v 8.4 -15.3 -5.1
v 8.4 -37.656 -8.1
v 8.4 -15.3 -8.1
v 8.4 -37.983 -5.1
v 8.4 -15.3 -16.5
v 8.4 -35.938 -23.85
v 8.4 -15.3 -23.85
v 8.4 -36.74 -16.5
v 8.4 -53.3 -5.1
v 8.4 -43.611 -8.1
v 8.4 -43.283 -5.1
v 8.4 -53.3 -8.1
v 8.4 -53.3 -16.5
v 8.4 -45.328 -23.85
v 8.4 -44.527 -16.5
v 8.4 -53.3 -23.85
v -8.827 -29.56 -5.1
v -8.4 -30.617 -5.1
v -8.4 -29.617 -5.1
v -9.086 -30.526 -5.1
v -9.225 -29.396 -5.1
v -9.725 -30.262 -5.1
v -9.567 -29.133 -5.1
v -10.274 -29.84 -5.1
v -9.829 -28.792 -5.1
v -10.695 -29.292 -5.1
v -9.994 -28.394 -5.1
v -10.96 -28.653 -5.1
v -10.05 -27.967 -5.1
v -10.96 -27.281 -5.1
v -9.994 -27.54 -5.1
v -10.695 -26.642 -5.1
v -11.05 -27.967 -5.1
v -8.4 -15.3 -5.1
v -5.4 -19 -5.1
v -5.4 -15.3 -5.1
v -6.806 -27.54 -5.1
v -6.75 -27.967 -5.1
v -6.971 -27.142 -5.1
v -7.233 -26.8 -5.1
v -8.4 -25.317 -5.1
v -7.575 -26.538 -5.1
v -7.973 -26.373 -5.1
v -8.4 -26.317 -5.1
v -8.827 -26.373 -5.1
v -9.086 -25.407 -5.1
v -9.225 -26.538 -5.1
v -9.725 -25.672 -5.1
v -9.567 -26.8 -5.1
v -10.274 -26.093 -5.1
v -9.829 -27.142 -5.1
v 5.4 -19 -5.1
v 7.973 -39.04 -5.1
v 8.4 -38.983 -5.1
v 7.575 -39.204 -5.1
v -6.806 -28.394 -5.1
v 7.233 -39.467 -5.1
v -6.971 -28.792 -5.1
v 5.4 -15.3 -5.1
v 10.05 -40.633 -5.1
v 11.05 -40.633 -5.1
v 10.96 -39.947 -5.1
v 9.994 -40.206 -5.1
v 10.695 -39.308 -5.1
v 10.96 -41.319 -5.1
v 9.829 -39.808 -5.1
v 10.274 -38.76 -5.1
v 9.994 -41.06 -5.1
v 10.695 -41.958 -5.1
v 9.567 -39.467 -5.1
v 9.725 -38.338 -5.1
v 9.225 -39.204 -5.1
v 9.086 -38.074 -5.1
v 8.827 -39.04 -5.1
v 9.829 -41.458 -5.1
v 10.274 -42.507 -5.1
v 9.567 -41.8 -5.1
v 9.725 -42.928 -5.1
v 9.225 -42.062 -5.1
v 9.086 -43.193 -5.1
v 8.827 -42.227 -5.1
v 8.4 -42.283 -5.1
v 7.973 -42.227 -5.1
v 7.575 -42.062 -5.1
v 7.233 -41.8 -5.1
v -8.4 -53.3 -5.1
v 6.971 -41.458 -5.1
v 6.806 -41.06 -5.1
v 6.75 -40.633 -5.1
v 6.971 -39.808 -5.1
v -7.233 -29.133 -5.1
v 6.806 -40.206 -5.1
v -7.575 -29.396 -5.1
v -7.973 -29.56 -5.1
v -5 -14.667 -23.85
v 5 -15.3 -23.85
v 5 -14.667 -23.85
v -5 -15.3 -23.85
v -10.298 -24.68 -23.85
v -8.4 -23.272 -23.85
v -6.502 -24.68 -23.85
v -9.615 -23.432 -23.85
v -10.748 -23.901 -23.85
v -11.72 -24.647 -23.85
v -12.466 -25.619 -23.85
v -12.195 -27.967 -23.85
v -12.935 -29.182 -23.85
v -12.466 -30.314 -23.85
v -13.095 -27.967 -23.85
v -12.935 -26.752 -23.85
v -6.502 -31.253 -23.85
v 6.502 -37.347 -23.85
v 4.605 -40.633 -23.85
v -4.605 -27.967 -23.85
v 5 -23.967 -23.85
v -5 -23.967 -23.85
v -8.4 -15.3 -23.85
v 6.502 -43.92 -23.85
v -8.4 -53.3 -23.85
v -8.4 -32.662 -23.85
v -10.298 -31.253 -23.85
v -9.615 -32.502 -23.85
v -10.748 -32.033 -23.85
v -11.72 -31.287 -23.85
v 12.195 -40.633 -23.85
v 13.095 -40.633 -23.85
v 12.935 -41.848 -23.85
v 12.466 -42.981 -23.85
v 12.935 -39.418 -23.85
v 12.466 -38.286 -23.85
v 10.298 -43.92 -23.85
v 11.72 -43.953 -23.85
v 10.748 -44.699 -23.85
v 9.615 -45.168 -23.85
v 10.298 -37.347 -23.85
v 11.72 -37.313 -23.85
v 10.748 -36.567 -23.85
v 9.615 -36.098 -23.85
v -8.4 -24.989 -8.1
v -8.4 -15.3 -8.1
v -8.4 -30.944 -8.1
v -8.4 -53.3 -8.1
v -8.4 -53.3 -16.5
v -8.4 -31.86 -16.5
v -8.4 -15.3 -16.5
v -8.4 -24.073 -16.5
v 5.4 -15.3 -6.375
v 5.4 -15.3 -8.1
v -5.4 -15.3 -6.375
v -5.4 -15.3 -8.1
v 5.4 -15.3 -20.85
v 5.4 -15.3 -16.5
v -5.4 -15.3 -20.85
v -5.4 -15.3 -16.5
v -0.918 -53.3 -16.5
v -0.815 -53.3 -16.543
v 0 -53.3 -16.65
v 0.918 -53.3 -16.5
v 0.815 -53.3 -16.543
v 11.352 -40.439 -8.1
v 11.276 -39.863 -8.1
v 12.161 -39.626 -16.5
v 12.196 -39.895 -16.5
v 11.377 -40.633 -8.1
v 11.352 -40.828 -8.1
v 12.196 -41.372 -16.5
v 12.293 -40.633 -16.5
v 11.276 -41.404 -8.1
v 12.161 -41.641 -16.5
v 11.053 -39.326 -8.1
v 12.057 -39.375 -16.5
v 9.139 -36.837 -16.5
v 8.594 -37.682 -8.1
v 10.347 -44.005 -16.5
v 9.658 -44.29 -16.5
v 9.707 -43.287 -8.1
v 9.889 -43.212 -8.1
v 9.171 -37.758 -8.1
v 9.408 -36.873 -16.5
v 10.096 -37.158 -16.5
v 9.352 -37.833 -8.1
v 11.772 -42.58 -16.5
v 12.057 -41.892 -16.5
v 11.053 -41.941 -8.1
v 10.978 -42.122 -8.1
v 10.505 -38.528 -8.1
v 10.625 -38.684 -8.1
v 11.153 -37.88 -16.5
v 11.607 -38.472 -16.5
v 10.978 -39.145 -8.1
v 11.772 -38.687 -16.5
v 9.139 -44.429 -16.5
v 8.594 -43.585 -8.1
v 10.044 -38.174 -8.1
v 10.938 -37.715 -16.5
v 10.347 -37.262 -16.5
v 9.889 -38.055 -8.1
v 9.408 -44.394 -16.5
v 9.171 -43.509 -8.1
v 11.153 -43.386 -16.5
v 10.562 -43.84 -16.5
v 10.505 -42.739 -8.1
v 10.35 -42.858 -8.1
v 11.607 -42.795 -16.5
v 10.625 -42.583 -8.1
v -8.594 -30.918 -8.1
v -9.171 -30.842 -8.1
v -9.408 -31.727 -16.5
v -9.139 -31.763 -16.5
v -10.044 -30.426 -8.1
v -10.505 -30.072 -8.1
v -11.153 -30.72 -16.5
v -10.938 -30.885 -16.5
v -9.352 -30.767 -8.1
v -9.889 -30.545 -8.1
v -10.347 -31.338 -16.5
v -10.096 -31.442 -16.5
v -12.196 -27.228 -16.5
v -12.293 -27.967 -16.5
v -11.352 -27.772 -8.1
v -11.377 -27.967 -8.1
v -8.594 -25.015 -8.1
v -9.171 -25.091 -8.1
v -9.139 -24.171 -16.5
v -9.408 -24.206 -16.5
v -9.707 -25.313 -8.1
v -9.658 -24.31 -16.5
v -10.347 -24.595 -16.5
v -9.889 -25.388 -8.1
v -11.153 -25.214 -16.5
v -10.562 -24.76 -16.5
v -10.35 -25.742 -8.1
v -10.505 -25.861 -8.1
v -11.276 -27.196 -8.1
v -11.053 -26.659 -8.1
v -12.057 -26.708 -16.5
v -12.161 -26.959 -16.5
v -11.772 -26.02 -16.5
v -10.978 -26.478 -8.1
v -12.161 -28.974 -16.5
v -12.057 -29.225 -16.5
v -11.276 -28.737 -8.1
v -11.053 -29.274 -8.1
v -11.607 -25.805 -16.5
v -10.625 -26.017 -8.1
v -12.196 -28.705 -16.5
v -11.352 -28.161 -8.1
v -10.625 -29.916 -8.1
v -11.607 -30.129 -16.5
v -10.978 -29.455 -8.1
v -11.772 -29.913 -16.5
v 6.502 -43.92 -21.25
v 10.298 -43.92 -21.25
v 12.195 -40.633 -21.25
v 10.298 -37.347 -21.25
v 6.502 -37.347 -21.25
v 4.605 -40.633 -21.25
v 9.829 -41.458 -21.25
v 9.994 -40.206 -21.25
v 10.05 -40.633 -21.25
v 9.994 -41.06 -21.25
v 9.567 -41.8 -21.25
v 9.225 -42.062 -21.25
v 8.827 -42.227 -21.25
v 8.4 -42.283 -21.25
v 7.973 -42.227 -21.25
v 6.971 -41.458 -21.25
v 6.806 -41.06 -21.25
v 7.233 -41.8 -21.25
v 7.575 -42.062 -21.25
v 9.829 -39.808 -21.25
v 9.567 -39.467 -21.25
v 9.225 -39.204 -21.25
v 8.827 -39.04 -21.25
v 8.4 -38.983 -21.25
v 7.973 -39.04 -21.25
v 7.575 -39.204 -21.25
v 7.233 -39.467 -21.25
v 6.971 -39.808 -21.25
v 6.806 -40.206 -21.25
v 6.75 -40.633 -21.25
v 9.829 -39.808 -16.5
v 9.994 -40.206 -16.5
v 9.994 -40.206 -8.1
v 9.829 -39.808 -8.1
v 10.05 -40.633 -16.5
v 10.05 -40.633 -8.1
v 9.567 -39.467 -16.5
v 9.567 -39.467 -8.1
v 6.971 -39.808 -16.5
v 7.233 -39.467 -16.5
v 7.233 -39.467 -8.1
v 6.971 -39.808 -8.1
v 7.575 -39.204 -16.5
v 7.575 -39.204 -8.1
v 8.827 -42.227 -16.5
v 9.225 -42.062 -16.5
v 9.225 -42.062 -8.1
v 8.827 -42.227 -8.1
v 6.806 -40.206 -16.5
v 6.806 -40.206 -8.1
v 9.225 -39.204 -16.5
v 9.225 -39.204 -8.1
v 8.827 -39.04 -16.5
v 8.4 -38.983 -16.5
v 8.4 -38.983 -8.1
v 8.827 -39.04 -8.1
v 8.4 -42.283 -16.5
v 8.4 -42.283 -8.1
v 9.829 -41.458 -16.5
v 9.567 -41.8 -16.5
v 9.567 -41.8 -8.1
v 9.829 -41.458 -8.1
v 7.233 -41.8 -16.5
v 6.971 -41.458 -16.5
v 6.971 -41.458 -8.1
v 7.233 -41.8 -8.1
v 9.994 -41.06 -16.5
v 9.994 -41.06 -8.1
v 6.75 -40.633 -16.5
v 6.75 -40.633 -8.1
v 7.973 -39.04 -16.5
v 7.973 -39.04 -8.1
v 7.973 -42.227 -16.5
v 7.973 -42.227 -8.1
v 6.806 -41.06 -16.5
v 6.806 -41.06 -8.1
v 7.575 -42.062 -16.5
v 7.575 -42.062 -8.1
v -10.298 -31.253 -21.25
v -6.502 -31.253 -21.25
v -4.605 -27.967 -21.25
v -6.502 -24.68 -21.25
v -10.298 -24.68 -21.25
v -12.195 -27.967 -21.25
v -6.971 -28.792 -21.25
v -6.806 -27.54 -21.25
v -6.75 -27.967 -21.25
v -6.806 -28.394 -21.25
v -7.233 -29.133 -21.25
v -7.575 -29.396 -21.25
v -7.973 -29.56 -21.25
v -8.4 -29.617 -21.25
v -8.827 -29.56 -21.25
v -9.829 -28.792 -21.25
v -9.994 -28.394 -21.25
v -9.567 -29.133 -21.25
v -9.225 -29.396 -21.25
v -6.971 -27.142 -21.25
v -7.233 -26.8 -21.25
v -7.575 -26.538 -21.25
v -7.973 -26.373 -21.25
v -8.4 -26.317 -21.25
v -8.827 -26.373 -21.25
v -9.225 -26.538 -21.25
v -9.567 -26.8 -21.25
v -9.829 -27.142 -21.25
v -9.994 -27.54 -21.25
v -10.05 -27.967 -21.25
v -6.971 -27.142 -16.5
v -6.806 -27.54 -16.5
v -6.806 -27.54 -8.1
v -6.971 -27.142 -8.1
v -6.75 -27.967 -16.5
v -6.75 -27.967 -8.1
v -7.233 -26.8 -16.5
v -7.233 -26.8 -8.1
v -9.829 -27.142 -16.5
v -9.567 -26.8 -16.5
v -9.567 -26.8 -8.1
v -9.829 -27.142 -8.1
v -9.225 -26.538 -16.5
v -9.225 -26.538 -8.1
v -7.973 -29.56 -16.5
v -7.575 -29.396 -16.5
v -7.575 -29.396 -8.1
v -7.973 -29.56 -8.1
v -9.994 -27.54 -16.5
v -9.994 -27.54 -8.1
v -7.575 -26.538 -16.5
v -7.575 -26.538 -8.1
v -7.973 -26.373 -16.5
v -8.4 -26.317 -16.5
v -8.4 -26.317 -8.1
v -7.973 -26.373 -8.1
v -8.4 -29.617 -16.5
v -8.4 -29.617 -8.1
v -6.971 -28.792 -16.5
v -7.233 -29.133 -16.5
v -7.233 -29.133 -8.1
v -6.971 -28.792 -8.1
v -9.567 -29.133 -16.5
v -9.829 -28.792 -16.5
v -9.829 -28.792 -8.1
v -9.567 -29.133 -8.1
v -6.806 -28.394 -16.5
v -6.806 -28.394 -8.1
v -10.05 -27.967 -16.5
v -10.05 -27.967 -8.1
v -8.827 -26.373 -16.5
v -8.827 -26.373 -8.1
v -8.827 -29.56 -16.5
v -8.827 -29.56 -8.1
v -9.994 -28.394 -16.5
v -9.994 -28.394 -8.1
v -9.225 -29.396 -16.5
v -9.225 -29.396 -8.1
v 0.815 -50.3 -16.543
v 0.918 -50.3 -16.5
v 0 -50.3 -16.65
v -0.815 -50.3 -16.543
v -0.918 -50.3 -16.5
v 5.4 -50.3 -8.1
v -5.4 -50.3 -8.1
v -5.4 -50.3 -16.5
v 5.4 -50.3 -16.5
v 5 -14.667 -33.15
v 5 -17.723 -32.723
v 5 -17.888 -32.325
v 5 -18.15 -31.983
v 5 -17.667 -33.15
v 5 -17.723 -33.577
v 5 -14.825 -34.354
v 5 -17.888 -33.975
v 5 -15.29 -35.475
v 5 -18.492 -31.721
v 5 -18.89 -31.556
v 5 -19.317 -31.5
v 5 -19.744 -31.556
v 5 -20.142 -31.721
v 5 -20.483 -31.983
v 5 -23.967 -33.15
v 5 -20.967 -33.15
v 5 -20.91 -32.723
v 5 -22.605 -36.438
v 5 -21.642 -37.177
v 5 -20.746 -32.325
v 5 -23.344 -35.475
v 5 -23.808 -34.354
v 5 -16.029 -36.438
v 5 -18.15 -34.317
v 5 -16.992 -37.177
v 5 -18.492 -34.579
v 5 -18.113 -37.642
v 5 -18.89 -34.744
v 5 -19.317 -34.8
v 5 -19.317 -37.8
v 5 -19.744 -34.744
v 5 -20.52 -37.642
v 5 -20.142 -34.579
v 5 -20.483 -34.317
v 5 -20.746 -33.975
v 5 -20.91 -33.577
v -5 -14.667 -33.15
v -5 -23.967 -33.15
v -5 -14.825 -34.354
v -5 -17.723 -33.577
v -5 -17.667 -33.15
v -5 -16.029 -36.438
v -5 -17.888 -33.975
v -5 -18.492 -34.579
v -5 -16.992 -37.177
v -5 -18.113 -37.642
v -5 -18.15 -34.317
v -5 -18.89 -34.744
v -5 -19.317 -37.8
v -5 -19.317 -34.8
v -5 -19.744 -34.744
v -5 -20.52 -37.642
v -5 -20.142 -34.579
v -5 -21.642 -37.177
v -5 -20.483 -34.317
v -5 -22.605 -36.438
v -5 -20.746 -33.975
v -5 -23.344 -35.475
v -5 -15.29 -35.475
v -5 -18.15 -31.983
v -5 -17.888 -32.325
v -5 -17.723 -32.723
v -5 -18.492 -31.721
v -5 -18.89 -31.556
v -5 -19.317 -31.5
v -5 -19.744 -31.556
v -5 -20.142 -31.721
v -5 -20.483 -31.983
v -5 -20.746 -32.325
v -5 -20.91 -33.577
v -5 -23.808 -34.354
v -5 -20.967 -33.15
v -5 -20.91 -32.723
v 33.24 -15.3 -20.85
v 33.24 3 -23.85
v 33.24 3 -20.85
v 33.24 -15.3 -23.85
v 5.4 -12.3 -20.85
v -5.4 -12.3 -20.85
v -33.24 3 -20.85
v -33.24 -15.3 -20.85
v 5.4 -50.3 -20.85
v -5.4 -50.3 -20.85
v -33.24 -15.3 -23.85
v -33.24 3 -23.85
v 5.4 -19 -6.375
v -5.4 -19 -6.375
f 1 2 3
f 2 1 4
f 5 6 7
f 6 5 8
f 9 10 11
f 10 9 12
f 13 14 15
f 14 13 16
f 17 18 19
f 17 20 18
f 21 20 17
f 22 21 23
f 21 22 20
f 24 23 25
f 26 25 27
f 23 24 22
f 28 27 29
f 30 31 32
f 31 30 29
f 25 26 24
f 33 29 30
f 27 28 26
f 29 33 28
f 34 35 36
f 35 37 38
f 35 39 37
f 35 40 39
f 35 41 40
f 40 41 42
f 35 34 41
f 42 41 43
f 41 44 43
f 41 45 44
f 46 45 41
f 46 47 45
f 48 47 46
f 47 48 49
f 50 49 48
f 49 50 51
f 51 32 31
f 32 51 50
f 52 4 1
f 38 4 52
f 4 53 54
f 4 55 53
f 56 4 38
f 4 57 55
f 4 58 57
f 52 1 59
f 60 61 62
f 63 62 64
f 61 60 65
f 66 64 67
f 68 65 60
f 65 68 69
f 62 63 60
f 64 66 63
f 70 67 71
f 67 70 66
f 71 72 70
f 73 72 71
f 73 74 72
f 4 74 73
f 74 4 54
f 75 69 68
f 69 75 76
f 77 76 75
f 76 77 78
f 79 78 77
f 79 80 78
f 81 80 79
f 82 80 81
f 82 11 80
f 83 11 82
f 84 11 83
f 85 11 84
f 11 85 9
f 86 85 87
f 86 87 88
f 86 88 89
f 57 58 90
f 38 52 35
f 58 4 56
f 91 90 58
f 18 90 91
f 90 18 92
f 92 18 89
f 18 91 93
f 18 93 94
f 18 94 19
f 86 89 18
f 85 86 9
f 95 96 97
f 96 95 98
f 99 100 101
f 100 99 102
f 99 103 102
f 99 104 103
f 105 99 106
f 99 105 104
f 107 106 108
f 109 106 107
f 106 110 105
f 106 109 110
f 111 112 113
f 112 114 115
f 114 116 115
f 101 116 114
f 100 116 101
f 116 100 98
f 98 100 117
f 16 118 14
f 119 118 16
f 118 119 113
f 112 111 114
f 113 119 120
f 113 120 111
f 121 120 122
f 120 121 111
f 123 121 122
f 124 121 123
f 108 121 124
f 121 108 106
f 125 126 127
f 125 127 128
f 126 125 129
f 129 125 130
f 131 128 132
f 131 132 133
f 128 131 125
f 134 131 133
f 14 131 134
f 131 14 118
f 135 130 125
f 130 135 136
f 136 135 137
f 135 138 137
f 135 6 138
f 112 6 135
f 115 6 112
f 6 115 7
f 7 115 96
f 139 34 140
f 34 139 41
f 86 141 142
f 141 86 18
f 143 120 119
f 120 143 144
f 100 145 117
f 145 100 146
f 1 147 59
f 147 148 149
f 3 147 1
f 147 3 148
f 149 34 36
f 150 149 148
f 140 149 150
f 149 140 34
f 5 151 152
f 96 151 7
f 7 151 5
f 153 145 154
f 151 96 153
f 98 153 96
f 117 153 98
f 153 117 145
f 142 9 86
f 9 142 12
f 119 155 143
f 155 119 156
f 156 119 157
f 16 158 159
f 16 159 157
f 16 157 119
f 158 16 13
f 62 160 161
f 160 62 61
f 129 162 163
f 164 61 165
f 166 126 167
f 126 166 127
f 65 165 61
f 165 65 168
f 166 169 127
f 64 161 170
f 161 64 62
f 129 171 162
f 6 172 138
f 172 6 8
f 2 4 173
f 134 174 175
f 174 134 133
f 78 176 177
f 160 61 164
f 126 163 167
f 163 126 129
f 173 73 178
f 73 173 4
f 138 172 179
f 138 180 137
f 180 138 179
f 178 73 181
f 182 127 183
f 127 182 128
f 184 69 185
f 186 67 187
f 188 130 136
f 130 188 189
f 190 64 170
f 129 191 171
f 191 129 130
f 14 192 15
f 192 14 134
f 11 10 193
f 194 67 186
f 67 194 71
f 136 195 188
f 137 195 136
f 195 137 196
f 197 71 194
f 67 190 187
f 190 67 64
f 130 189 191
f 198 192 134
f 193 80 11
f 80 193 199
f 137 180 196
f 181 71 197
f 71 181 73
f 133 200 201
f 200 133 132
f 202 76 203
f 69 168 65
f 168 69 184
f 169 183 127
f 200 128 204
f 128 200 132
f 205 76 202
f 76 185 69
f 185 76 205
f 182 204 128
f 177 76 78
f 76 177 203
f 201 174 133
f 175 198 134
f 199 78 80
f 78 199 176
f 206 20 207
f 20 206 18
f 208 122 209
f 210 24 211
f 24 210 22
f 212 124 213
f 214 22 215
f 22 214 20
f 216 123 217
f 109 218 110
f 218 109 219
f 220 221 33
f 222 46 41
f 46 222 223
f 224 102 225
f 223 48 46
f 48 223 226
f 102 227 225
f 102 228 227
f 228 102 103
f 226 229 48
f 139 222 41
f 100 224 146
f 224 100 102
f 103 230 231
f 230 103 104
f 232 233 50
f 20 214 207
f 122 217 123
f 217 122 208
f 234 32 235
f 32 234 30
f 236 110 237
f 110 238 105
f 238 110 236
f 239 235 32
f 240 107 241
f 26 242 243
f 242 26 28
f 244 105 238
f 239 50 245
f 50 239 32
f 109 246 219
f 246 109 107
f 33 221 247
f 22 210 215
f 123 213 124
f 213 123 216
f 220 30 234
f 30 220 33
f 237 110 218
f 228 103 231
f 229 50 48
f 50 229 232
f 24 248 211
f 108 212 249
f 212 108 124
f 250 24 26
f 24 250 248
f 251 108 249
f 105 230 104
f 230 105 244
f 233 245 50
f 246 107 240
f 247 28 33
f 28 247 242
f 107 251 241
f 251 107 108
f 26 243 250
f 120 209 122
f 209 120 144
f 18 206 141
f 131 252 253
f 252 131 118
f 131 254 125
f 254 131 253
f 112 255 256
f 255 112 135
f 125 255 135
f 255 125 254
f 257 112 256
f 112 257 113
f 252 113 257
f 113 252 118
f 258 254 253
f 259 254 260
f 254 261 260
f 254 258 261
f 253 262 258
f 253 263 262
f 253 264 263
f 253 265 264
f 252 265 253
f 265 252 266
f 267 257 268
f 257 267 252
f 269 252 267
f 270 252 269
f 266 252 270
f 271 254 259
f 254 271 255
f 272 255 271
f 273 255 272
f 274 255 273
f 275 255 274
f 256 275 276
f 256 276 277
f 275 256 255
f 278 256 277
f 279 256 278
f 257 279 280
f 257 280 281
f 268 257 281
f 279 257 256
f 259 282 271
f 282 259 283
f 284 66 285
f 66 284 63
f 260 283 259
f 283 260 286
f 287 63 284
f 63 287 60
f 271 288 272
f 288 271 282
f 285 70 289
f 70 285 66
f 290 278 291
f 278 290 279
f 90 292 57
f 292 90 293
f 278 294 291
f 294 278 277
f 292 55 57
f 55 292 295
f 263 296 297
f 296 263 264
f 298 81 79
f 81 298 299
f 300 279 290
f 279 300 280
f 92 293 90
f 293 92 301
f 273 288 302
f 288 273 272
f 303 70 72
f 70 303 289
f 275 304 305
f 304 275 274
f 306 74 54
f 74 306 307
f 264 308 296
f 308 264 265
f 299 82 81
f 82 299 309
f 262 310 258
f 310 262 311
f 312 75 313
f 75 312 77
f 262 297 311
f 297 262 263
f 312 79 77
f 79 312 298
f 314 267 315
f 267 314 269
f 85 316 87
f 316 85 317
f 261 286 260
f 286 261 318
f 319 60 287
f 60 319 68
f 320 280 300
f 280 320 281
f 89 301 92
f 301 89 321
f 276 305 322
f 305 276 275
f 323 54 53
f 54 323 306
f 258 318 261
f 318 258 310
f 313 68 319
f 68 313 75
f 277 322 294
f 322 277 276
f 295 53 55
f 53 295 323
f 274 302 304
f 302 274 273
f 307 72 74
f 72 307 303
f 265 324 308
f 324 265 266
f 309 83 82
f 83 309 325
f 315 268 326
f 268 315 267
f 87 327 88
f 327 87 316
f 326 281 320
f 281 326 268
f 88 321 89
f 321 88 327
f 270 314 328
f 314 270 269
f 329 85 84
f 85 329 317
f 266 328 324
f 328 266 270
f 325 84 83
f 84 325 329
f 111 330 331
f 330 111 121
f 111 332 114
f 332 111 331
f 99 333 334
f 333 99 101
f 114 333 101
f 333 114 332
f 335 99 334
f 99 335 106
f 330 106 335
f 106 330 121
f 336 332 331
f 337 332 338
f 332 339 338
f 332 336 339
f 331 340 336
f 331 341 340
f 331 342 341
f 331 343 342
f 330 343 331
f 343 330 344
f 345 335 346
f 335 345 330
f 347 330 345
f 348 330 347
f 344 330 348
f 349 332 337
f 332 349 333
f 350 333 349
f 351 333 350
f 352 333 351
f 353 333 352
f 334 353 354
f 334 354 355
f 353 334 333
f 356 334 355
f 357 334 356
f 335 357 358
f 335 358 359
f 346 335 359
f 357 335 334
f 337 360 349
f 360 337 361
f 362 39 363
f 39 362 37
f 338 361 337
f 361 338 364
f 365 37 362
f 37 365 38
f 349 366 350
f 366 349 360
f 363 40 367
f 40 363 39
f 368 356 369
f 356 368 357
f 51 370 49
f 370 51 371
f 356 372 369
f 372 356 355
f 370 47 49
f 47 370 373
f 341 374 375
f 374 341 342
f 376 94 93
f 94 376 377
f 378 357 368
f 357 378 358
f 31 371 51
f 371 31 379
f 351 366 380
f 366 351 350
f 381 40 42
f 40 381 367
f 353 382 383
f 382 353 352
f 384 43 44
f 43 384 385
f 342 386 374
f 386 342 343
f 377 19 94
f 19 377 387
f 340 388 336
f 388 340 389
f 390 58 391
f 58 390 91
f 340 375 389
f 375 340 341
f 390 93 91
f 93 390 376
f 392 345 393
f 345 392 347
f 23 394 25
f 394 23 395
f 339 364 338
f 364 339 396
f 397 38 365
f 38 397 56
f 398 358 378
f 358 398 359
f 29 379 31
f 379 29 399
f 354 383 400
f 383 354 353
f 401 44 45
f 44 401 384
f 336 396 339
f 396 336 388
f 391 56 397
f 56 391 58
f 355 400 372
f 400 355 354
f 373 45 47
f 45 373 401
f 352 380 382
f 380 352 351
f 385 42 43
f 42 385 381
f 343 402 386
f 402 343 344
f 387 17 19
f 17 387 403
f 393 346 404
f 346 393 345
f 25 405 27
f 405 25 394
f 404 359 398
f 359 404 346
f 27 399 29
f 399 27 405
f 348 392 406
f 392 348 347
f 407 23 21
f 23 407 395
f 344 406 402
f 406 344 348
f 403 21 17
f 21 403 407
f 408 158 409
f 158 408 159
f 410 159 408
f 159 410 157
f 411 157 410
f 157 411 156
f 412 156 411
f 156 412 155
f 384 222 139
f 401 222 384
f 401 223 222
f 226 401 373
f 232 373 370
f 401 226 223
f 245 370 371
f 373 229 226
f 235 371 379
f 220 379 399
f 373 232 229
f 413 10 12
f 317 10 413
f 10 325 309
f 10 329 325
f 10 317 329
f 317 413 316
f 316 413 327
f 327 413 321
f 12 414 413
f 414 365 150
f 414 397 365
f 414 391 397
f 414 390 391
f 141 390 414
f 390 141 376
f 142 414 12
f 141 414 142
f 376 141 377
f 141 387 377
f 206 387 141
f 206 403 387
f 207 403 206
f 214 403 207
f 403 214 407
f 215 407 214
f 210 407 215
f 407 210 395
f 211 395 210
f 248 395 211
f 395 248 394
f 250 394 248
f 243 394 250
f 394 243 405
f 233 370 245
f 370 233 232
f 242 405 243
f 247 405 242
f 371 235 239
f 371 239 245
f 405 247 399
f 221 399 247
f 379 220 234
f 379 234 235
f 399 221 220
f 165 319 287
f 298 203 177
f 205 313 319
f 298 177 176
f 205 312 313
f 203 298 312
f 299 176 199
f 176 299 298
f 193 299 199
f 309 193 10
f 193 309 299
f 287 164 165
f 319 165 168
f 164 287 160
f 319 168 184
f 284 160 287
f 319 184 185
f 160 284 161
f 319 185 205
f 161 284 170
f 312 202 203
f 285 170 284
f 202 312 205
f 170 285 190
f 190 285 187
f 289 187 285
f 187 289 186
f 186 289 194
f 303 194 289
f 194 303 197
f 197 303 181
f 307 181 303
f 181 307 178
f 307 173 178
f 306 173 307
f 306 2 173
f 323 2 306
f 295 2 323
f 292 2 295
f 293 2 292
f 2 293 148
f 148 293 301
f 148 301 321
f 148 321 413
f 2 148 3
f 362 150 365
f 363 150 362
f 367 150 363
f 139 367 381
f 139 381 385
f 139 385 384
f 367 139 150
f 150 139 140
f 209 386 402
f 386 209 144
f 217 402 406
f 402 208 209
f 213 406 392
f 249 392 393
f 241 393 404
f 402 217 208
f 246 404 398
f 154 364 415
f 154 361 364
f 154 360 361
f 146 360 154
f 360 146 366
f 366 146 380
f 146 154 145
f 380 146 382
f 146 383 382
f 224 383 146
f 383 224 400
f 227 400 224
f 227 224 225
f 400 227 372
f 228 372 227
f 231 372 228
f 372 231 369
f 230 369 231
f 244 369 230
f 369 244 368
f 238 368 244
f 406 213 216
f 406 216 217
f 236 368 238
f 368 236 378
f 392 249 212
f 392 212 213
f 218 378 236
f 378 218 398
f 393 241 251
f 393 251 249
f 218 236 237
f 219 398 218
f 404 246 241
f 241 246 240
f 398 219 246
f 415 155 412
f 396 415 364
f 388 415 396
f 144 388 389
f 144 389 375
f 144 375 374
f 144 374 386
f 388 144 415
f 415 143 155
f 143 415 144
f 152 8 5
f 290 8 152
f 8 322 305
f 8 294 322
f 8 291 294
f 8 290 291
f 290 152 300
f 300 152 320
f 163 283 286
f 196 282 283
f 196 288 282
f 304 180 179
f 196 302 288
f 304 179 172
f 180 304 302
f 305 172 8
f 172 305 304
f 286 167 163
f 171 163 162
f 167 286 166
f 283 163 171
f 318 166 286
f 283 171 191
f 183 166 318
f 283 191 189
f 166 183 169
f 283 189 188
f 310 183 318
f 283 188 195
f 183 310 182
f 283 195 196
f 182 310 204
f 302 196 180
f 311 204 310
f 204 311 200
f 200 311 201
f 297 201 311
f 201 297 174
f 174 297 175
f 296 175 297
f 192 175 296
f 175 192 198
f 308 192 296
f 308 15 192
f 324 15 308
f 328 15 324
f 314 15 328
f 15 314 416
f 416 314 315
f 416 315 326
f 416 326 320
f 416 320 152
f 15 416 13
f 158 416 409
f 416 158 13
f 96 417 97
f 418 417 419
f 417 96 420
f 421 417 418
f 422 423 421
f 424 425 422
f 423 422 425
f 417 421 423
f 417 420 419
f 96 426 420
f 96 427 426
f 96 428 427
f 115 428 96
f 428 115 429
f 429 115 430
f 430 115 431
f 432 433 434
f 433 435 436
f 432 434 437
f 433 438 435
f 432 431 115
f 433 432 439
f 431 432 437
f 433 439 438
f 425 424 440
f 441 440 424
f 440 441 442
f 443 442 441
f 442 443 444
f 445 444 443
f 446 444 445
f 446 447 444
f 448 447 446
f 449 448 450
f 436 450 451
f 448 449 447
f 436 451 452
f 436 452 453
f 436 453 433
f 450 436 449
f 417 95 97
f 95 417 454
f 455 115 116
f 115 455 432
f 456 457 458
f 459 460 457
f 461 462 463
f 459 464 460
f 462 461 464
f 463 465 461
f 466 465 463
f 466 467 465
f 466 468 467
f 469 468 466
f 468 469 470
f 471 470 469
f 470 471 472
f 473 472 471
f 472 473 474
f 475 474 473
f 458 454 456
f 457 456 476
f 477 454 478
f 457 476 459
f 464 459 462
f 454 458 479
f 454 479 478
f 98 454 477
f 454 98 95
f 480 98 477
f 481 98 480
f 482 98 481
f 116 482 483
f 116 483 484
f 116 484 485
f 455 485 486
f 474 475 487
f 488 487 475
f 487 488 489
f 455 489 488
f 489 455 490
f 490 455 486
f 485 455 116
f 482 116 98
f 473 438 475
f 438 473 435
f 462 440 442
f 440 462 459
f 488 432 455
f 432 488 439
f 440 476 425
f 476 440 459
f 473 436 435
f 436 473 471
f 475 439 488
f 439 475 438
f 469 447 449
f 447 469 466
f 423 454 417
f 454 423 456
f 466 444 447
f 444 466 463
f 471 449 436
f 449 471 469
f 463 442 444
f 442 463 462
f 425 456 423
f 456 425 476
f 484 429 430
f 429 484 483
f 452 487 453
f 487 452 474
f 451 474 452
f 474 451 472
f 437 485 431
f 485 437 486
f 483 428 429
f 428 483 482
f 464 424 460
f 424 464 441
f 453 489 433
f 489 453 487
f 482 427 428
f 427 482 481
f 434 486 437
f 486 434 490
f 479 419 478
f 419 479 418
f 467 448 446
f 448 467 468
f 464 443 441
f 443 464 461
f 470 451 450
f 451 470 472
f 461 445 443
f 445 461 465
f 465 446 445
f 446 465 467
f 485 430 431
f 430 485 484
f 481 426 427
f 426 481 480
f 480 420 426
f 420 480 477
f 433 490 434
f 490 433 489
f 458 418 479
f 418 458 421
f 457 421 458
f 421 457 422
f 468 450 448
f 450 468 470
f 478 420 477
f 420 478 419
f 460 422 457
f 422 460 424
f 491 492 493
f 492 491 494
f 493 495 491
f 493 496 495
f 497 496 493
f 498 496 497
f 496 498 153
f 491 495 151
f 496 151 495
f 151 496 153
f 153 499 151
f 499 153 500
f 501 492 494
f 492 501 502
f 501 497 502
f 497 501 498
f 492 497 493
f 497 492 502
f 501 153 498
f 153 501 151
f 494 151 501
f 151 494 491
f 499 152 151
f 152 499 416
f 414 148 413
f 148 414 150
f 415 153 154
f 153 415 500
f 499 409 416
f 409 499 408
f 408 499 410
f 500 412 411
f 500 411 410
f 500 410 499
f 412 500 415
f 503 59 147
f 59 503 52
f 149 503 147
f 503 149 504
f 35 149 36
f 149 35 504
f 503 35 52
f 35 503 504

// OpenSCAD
// file: common_vars.scad
// General parameters
wall_thickness = 3.0;
extra_space = 0.5;

// Board dimensions
board_thickness = 1.3;
board_size = 37.8;
board_hole_diameter = 2.0;
board_hole_center_distance_from_board_edge = 1.8;
board_elements_height = 2.0;

// Lens dimensions
lens_box_distance_from_board_edge = 11.0;
lens_box_size = 16.6;
lens_screw_head_diameter = 4.5;
lens_screw_offset = 9.8;
box_eyelet_size = 4;
box_eyelet_thickness = 3.2;

// Screw dimensions
screw_diameter = 1.5;
screw_depth = 9.0;
screw_wall_thickness = board_hole_center_distance_from_board_edge - screw_diameter / 2;
screw_well_x_offset = board_size / 2 - board_hole_center_distance_from_board_edge;
screw_well_z_offset = board_size / 2 - board_hole_center_distance_from_board_edge;
board_extra_size = wall_thickness - screw_wall_thickness;

// Wire parameters
wire_diameter = 6.3;
wire_length = 35.0;
socket_width = 10.8;
socket_height = 10.8;

// Bolt parameters
nut_diameter = 6.4;
nut_height = 2.4;
bolt_diameter = 2.8 +  extra_space;
bolt_well_wall_thickness = 1.0;
bolt_well_diameter_wide = nut_diameter / cos(180 / 6) + bolt_well_wall_thickness * 2;
bolt_well_diameter_narrow = bolt_diameter + bolt_well_wall_thickness * 2;
bolt_well_height = screw_depth + board_thickness + board_elements_height;
bolt_well_x_offset = board_size / 2 + board_extra_size + bolt_well_diameter_wide / 2;
bolt_well_y_offset = board_thickness + board_elements_height;
bolt_well_z_offset = board_size / 2 - bolt_well_diameter_wide / 2 + board_extra_size;
bolt_hole_y_offset = -bolt_well_height;

// Tail dimension
tail_x_dim = socket_width + wall_thickness * 2;
tail_y_dim = wire_length + wall_thickness;
tail_z_dim = socket_height + wall_thickness + board_extra_size + wall_thickness;

// Hinge
hinge_length = 10.0;
hinge_diameter = bolt_diameter + 2 * wall_thickness;

// Stand
stand_length = board_size;

// T-Nut parameters
t_nut_well_diameter = 7.3;
t_nut_height = 8.8;
t_nut_cap_thicklness = 1.4;
t_nut_cap_diameter = 18.0;
t_nut_spike_length = 7.4;
t_nut_spike_width = 2.6;

module nut_trap() {
    cylinder(d = nut_diameter / cos(180 / 6) + 0.2, h = nut_height + 0.2, $fn = 6);
}

module bolt_well(vertical, height) {
    angle = vertical ? 180 : 90;
    rotate(a=[angle, 0, 0])
        cylinder($fn = 24, d1 = bolt_well_diameter_narrow, d2 = bolt_well_diameter_wide, h = height);
}

module bolt_hole(vertical) {
    angle = vertical ? 0 : 270;
    rotate(a=[angle, 0, 0]) union() {
        nut_trap();
        cylinder($fn = 24, h = 100, d = bolt_diameter);
    }
}

module tail() {
    difference() {
        union() {
            cube(size = [tail_x_dim, tail_y_dim, tail_z_dim]);
            translate([tail_x_dim, tail_y_dim / 3, tail_z_dim]) bolt_well(true, tail_z_dim);
            translate([0, tail_y_dim / 3 * 2, tail_z_dim]) bolt_well(true, tail_z_dim);
        }
        translate([tail_x_dim, tail_y_dim / 3, 0]) bolt_hole(true);
        translate([0, tail_y_dim / 3 * 2, 0]) bolt_hole(true);
        translate([socket_width / 2 + wall_thickness, 50, socket_height / 2 + board_extra_size + wall_thickness]) rotate(a=[90, 0, 0]) cylinder($fn = 24, d = wire_diameter, h = 100);
    }
}

module socket_cutout() {
    cube(size = [socket_width, tail_y_dim, socket_height + board_extra_size], center=true);
}

module horizontal_wall() {
    translate([0, bolt_well_height / 2 + wall_thickness, wall_thickness / 2]) cube(size = [board_size + board_extra_size * 2 + bolt_well_diameter_wide * 2 + wall_thickness * 2, wall_thickness + bolt_well_height + wall_thickness, wall_thickness], center=true);
}

module side_wall() {
    translate([0, -wall_thickness - bolt_well_height, -board_size / 2 - board_extra_size - wall_thickness]) cube(size = [wall_thickness, wall_thickness + bolt_well_height + wall_thickness, board_size + board_extra_size * 2 + wall_thickness * 2]);
}

module hinge_block(cylinder_length) {
    difference() {
        union() {
            cube(size = [cylinder_length, hinge_diameter, hinge_diameter]);
            translate([0, hinge_diameter, hinge_diameter / 2]) rotate(a = [0, 90, 0]) cylinder($fn = 24, d = hinge_diameter, h = cylinder_length);
        }
        translate([0, hinge_diameter, hinge_diameter / 2]) rotate(a = [0, 90, 0]) cylinder($fn = 24, d = bolt_diameter, h = cylinder_length);
    }
}
// main file
include <common_vars.scad>

module lens_box() {
    cube(size = [lens_box_size, 100, lens_box_size], center = true);
}

module lens_eyelet() {
    cube(size = [box_eyelet_size, 100, box_eyelet_size], center = true);
}

module front_wall() {
    translate([0, wall_thickness / 2, 0]) cube(size = [board_size + board_extra_size * 2 + bolt_well_diameter_wide * 2, wall_thickness, board_size + board_extra_size * 2], center = true);
}

module tail_bottom() {
    difference() {
        tail();
        translate([-bolt_well_diameter_wide / 2, 0, socket_height / 2 + board_extra_size]) cube(size = [tail_x_dim + bolt_well_diameter_wide, tail_y_dim, socket_height / 2 + wall_thickness]);
    }
}

module front_panel() {
    difference() {
        union() {
            // front_wall();
            //translate([board_size / 2 + board_extra_size + bolt_well_diameter_wide, 0, 0] ) side_wall();
            //translate([-board_size / 2 - board_extra_size - bolt_well_diameter_wide - wall_thickness, 0, 0] ) side_wall();
            //translate([0, -wall_thickness - bolt_well_height, board_size / 2  + board_extra_size]) horizontal_wall();
            translate([0, -wall_thickness - bolt_well_height, -board_size / 2 - board_extra_size - wall_thickness]) horizontal_wall();
            translate([-socket_width / 2 - wall_thickness, -wire_length - wall_thickness - bolt_well_height - wall_thickness, -board_size / 2 - board_extra_size - wall_thickness]) tail_bottom();
            translate([-hinge_length / 2, -bolt_well_height - wire_length / 3, -board_size / 2 - board_extra_size - wall_thickness]) rotate(a = [270, 0, 0]) hinge_block(hinge_length);
        }
        //lens_box();
        //translate([lens_box_size / 2 + box_eyelet_size / 2, 0, 0]) lens_eyelet();
        //translate([-lens_box_size / 2 - box_eyelet_size / 2, 0, 0]) lens_eyelet();
        //translate([bolt_well_x_offset, bolt_hole_y_offset, bolt_well_z_offset]) bolt_hole(false);
        //translate([-bolt_well_x_offset, bolt_hole_y_offset, bolt_well_z_offset]) bolt_hole(false);
        //translate([bolt_well_x_offset, bolt_hole_y_offset, -bolt_well_z_offset]) bolt_hole(false);
        //translate([-bolt_well_x_offset, bolt_hole_y_offset, -bolt_well_z_offset]) bolt_hole(false);
        // Socket cutout
        translate([0, -tail_y_dim / 2 - bolt_well_height, socket_height / 2 + board_extra_size / 2 - board_size / 2 - board_extra_size]) socket_cutout();
        socket_cutout();
    }
}

front_panel();
